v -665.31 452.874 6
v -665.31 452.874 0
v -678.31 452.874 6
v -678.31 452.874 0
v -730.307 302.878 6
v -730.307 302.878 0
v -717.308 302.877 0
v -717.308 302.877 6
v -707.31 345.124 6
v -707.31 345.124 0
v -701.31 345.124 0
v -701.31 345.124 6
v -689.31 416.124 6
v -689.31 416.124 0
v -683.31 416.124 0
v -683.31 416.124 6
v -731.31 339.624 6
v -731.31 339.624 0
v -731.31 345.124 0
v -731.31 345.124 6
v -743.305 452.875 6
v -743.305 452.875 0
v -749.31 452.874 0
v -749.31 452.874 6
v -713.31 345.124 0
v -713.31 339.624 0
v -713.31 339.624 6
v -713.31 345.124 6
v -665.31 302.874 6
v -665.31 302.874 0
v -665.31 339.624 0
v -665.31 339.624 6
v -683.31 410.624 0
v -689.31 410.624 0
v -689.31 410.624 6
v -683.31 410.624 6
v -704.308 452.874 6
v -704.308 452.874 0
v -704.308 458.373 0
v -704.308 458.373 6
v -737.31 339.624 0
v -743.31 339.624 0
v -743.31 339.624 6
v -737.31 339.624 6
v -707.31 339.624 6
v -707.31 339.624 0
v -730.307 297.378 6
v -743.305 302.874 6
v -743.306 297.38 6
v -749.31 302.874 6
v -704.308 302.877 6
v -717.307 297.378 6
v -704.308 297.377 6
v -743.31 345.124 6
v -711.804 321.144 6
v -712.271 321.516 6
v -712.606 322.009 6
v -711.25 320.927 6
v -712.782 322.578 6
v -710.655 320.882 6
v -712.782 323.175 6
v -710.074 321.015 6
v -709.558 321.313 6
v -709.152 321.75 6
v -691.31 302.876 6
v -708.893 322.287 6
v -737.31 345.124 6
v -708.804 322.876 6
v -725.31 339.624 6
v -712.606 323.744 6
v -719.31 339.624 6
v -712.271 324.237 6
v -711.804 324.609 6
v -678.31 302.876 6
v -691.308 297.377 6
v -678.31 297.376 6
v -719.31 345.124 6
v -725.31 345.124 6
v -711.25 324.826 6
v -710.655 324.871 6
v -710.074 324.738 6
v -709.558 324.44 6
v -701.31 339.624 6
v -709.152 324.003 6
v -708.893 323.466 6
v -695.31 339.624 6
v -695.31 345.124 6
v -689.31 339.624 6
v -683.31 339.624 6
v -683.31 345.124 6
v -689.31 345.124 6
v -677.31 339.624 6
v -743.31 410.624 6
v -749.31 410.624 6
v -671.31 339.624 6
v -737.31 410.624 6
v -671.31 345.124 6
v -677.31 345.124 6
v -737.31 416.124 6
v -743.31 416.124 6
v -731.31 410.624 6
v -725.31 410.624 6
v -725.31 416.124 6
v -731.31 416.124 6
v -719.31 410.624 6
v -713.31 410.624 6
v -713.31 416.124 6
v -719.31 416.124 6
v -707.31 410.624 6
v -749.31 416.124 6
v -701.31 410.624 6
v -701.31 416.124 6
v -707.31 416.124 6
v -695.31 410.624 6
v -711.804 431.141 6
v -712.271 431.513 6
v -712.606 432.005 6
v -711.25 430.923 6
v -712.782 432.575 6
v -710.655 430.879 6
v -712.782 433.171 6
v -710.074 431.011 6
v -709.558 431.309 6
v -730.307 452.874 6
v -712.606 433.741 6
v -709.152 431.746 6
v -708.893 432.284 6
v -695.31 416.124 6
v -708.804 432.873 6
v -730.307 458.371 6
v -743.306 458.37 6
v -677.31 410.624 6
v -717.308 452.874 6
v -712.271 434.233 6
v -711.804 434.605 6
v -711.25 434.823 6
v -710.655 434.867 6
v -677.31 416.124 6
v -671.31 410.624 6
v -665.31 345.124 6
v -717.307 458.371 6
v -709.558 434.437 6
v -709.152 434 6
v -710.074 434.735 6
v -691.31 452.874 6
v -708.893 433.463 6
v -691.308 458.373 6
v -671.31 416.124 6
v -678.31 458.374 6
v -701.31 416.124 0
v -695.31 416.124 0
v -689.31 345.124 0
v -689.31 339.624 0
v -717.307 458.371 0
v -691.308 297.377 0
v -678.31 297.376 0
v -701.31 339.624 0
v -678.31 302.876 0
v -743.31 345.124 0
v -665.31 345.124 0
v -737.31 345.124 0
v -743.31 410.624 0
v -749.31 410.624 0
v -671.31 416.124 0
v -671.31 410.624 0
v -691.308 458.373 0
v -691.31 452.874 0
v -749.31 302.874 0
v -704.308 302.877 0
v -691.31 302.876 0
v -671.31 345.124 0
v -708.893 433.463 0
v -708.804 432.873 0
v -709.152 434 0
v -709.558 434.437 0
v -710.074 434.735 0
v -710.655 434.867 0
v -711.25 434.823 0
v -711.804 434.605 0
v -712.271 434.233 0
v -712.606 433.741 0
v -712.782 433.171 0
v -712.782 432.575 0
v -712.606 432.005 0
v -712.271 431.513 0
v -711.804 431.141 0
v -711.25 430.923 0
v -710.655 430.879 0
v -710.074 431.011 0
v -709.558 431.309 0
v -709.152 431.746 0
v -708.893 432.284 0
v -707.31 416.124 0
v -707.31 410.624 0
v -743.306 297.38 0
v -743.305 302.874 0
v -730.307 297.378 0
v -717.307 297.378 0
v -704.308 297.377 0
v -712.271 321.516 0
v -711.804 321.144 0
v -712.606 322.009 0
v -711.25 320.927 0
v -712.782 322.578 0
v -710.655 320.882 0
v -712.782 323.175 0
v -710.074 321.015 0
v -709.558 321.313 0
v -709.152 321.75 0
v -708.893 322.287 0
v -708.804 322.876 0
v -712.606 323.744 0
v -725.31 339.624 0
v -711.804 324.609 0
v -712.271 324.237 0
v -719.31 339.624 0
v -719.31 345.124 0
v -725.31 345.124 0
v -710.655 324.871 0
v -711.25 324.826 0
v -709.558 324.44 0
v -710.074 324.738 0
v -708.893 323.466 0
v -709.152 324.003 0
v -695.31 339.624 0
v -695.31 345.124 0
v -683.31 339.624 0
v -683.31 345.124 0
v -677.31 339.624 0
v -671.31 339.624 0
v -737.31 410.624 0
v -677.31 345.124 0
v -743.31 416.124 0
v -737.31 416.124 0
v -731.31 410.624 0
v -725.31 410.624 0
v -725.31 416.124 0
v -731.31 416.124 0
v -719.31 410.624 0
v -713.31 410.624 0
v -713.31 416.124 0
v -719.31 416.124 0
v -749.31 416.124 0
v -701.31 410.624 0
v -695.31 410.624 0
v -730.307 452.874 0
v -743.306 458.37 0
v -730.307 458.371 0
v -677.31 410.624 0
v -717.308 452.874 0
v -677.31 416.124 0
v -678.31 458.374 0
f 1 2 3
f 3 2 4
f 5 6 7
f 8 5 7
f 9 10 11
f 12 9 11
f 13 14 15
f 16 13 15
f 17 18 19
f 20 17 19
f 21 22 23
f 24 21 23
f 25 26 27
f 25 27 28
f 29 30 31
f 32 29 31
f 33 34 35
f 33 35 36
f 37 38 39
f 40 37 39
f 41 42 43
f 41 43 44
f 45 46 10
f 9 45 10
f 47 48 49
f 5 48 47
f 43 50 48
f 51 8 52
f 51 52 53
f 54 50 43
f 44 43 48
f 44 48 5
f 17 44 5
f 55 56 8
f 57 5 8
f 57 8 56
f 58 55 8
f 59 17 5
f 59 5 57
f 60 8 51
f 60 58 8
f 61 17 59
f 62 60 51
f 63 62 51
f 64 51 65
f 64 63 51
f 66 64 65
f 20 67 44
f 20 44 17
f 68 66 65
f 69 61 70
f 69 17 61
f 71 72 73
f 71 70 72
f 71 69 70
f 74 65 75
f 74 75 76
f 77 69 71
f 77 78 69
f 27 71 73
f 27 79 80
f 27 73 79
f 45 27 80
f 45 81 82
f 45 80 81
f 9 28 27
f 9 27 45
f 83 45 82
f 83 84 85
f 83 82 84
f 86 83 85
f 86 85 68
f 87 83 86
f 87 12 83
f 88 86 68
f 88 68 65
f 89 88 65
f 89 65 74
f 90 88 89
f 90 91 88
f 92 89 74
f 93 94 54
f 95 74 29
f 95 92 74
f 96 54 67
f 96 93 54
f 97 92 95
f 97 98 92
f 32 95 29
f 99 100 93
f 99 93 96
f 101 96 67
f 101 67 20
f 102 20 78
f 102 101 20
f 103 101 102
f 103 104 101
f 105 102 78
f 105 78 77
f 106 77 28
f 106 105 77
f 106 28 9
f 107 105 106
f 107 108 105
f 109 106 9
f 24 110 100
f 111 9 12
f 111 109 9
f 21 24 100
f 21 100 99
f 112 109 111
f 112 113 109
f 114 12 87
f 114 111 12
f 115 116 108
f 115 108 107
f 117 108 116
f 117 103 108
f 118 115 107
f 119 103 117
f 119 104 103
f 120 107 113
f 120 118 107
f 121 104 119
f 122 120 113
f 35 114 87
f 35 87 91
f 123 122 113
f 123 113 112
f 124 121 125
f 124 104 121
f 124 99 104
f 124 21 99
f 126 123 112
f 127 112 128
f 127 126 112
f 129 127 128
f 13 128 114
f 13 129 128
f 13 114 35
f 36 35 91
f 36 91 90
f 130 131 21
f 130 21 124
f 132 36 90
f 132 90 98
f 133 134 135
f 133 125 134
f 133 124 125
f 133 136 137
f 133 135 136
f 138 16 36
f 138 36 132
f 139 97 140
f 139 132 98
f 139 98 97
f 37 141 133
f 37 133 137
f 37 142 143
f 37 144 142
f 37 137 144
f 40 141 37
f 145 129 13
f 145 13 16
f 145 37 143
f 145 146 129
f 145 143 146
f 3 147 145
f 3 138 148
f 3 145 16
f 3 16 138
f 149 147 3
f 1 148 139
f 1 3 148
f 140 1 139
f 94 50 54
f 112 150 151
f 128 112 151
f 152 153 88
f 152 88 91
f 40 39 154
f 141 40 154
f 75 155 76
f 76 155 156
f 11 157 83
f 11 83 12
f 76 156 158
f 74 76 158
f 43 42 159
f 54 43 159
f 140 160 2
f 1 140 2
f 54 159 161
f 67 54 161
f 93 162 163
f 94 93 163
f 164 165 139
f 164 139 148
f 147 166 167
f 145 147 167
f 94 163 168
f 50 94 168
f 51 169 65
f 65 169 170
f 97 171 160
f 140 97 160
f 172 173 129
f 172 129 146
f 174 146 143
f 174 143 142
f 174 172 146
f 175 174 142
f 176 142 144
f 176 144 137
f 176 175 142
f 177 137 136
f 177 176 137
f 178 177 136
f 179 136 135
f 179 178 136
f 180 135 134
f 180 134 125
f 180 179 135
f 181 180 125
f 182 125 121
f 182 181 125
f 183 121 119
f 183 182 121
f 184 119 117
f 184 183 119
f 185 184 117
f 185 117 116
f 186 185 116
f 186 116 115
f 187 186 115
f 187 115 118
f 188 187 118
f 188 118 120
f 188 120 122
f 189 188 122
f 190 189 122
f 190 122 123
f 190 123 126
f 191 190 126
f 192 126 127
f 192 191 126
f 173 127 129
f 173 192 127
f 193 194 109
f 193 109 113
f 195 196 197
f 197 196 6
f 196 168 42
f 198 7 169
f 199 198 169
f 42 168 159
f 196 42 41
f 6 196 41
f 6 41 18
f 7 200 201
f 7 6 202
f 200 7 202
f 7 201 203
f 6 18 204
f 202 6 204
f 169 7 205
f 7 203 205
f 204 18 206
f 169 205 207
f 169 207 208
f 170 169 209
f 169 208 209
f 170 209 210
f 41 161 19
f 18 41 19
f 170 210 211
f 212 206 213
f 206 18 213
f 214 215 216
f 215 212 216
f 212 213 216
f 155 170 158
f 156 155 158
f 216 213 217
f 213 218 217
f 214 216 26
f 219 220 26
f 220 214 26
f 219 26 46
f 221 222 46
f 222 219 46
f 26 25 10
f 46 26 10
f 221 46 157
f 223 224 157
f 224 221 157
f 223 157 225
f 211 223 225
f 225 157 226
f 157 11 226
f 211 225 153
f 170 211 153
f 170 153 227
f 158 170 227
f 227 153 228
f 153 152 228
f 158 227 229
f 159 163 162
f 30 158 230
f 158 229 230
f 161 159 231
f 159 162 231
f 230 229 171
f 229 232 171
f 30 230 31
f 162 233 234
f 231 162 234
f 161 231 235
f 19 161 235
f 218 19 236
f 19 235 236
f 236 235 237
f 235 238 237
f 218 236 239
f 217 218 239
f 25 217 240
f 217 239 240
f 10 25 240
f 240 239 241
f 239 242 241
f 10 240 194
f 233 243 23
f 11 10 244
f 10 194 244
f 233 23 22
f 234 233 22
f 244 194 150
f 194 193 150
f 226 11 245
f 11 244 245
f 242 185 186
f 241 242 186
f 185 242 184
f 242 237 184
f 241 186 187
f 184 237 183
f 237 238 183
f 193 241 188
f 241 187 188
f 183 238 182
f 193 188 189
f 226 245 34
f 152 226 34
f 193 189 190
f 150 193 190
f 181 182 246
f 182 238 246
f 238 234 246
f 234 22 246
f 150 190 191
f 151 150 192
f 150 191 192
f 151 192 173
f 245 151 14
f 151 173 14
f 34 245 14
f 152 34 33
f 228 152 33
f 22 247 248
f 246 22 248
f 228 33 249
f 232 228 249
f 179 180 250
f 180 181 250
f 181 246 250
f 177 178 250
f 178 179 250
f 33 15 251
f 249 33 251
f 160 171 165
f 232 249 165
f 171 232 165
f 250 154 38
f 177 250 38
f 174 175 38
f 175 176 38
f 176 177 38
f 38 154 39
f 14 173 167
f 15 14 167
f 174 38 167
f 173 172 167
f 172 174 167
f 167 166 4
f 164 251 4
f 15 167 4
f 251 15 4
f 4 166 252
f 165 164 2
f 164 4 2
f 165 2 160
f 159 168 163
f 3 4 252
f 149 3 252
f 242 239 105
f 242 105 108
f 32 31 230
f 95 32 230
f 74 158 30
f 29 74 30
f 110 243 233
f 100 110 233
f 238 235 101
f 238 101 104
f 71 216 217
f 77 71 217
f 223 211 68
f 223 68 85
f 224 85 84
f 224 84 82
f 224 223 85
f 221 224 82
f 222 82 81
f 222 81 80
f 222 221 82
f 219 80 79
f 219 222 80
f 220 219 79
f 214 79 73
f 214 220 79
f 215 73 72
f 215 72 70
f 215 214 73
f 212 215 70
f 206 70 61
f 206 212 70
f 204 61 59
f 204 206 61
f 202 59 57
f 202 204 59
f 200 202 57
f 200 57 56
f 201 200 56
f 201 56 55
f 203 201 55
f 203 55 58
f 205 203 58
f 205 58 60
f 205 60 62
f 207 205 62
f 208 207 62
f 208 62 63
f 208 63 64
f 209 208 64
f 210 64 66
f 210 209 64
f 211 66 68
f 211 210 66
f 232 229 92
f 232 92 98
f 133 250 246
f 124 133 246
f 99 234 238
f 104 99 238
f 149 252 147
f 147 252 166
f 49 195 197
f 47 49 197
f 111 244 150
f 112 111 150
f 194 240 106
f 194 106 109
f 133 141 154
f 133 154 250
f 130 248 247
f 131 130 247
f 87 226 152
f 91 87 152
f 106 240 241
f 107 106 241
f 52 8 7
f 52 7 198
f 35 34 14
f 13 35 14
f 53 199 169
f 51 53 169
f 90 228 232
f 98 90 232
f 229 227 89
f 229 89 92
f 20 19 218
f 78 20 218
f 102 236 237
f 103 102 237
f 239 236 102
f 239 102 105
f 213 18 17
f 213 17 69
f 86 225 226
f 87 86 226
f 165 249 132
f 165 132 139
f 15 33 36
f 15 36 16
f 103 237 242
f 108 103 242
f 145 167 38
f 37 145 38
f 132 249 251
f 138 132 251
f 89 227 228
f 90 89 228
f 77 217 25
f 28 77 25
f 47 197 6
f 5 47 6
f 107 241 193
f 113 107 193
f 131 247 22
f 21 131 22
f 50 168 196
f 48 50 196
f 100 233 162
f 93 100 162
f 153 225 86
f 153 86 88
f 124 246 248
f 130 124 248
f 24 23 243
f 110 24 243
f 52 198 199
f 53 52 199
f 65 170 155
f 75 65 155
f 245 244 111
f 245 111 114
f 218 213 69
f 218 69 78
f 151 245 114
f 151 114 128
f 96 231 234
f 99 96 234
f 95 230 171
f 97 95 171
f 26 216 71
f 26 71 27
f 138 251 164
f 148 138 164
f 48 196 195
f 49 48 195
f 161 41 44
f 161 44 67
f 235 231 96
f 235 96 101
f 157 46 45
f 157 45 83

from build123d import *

# Parameters (mm, degrees)
MODEL_R             = 2
MODEL_W             = 6
MODEL_H             = 5.5
BOSS_EXTRUDE1_DEPTH = 6


with BuildPart() as part:
    # Model → Boss-Extrude1 (new body)
    with BuildSketch(Plane.XY):
        Polygon((-665.309655483, 302.874496351), (-665.309655483, 339.624496351), (-671.309655483, 339.624496351), (-671.309655483, 345.124496351), (-665.309655483, 345.124496351), (-665.309655483, 452.874496351), (-678.309655483, 452.874496351), (-678.309655483, 458.373843725), (-691.308294267, 458.372538473), (-691.309655483, 452.874496351), (-704.308294267, 452.874496351), (-704.308294267, 458.372538473), (-717.306933052, 458.37123322), (-717.308294267, 452.874496351), (-730.306933052, 452.874496351), (-730.306933052, 458.37123322), (-743.305571836, 458.369927968), (-743.305020076, 452.875099304), (-749.309655483, 452.874496351), (-749.309655483, 416.124496351), (-743.309655483, 416.124496351), (-743.309655483, 410.624496351), (-749.309655483, 410.624496351), (-749.309655483, 302.874496351), (-743.305020081, 302.874496351), (-743.305571836, 297.379717361), (-730.306933052, 297.378412108), (-730.306933052, 302.878412108), (-717.308294267, 302.877106856), (-717.306933052, 297.378412108), (-704.308294267, 297.377106856), (-704.308294267, 302.877106856), (-691.309655483, 302.875801604), (-691.308294267, 297.377106856), (-678.309655483, 297.375801604), (-678.309655483, 302.875801604), align=None)
        with Locations((-710.804492218, 322.87645388)):
            Circle(MODEL_R, mode=Mode.SUBTRACT)
        with Locations((-710.804492218, 432.873034264)):
            Circle(MODEL_R, mode=Mode.SUBTRACT)
        with Locations((-698.309655483, 413.374496351)):
            Rectangle(MODEL_W, MODEL_H, mode=Mode.SUBTRACT)
        with Locations((-686.309655483, 413.374496351)):
            Rectangle(MODEL_W, MODEL_H, mode=Mode.SUBTRACT)
        with Locations((-674.309655483, 413.374496351)):
            Rectangle(MODEL_W, MODEL_H, mode=Mode.SUBTRACT)
        with Locations((-710.309655483, 413.374496351)):
            Rectangle(MODEL_W, MODEL_H, mode=Mode.SUBTRACT)
        with Locations((-722.309655483, 413.374496351)):
            Rectangle(MODEL_W, MODEL_H, mode=Mode.SUBTRACT)
        with Locations((-734.309655483, 413.374496351)):
            Rectangle(MODEL_W, MODEL_H, mode=Mode.SUBTRACT)
        with Locations((-704.309655483, 342.374496351)):
            Rectangle(MODEL_W, MODEL_H, mode=Mode.SUBTRACT)
        with Locations((-692.309655483, 342.374496351)):
            Rectangle(MODEL_W, MODEL_H, mode=Mode.SUBTRACT)
        with Locations((-680.309655483, 342.374496351)):
            Rectangle(MODEL_W, MODEL_H, mode=Mode.SUBTRACT)
        with Locations((-716.309655483, 342.374496351)):
            Rectangle(MODEL_W, MODEL_H, mode=Mode.SUBTRACT)
        with Locations((-728.309655483, 342.374496351)):
            Rectangle(MODEL_W, MODEL_H, mode=Mode.SUBTRACT)
        with Locations((-740.309655483, 342.374496351)):
            Rectangle(MODEL_W, MODEL_H, mode=Mode.SUBTRACT)
    extrude(amount=BOSS_EXTRUDE1_DEPTH)


solid = part.part
